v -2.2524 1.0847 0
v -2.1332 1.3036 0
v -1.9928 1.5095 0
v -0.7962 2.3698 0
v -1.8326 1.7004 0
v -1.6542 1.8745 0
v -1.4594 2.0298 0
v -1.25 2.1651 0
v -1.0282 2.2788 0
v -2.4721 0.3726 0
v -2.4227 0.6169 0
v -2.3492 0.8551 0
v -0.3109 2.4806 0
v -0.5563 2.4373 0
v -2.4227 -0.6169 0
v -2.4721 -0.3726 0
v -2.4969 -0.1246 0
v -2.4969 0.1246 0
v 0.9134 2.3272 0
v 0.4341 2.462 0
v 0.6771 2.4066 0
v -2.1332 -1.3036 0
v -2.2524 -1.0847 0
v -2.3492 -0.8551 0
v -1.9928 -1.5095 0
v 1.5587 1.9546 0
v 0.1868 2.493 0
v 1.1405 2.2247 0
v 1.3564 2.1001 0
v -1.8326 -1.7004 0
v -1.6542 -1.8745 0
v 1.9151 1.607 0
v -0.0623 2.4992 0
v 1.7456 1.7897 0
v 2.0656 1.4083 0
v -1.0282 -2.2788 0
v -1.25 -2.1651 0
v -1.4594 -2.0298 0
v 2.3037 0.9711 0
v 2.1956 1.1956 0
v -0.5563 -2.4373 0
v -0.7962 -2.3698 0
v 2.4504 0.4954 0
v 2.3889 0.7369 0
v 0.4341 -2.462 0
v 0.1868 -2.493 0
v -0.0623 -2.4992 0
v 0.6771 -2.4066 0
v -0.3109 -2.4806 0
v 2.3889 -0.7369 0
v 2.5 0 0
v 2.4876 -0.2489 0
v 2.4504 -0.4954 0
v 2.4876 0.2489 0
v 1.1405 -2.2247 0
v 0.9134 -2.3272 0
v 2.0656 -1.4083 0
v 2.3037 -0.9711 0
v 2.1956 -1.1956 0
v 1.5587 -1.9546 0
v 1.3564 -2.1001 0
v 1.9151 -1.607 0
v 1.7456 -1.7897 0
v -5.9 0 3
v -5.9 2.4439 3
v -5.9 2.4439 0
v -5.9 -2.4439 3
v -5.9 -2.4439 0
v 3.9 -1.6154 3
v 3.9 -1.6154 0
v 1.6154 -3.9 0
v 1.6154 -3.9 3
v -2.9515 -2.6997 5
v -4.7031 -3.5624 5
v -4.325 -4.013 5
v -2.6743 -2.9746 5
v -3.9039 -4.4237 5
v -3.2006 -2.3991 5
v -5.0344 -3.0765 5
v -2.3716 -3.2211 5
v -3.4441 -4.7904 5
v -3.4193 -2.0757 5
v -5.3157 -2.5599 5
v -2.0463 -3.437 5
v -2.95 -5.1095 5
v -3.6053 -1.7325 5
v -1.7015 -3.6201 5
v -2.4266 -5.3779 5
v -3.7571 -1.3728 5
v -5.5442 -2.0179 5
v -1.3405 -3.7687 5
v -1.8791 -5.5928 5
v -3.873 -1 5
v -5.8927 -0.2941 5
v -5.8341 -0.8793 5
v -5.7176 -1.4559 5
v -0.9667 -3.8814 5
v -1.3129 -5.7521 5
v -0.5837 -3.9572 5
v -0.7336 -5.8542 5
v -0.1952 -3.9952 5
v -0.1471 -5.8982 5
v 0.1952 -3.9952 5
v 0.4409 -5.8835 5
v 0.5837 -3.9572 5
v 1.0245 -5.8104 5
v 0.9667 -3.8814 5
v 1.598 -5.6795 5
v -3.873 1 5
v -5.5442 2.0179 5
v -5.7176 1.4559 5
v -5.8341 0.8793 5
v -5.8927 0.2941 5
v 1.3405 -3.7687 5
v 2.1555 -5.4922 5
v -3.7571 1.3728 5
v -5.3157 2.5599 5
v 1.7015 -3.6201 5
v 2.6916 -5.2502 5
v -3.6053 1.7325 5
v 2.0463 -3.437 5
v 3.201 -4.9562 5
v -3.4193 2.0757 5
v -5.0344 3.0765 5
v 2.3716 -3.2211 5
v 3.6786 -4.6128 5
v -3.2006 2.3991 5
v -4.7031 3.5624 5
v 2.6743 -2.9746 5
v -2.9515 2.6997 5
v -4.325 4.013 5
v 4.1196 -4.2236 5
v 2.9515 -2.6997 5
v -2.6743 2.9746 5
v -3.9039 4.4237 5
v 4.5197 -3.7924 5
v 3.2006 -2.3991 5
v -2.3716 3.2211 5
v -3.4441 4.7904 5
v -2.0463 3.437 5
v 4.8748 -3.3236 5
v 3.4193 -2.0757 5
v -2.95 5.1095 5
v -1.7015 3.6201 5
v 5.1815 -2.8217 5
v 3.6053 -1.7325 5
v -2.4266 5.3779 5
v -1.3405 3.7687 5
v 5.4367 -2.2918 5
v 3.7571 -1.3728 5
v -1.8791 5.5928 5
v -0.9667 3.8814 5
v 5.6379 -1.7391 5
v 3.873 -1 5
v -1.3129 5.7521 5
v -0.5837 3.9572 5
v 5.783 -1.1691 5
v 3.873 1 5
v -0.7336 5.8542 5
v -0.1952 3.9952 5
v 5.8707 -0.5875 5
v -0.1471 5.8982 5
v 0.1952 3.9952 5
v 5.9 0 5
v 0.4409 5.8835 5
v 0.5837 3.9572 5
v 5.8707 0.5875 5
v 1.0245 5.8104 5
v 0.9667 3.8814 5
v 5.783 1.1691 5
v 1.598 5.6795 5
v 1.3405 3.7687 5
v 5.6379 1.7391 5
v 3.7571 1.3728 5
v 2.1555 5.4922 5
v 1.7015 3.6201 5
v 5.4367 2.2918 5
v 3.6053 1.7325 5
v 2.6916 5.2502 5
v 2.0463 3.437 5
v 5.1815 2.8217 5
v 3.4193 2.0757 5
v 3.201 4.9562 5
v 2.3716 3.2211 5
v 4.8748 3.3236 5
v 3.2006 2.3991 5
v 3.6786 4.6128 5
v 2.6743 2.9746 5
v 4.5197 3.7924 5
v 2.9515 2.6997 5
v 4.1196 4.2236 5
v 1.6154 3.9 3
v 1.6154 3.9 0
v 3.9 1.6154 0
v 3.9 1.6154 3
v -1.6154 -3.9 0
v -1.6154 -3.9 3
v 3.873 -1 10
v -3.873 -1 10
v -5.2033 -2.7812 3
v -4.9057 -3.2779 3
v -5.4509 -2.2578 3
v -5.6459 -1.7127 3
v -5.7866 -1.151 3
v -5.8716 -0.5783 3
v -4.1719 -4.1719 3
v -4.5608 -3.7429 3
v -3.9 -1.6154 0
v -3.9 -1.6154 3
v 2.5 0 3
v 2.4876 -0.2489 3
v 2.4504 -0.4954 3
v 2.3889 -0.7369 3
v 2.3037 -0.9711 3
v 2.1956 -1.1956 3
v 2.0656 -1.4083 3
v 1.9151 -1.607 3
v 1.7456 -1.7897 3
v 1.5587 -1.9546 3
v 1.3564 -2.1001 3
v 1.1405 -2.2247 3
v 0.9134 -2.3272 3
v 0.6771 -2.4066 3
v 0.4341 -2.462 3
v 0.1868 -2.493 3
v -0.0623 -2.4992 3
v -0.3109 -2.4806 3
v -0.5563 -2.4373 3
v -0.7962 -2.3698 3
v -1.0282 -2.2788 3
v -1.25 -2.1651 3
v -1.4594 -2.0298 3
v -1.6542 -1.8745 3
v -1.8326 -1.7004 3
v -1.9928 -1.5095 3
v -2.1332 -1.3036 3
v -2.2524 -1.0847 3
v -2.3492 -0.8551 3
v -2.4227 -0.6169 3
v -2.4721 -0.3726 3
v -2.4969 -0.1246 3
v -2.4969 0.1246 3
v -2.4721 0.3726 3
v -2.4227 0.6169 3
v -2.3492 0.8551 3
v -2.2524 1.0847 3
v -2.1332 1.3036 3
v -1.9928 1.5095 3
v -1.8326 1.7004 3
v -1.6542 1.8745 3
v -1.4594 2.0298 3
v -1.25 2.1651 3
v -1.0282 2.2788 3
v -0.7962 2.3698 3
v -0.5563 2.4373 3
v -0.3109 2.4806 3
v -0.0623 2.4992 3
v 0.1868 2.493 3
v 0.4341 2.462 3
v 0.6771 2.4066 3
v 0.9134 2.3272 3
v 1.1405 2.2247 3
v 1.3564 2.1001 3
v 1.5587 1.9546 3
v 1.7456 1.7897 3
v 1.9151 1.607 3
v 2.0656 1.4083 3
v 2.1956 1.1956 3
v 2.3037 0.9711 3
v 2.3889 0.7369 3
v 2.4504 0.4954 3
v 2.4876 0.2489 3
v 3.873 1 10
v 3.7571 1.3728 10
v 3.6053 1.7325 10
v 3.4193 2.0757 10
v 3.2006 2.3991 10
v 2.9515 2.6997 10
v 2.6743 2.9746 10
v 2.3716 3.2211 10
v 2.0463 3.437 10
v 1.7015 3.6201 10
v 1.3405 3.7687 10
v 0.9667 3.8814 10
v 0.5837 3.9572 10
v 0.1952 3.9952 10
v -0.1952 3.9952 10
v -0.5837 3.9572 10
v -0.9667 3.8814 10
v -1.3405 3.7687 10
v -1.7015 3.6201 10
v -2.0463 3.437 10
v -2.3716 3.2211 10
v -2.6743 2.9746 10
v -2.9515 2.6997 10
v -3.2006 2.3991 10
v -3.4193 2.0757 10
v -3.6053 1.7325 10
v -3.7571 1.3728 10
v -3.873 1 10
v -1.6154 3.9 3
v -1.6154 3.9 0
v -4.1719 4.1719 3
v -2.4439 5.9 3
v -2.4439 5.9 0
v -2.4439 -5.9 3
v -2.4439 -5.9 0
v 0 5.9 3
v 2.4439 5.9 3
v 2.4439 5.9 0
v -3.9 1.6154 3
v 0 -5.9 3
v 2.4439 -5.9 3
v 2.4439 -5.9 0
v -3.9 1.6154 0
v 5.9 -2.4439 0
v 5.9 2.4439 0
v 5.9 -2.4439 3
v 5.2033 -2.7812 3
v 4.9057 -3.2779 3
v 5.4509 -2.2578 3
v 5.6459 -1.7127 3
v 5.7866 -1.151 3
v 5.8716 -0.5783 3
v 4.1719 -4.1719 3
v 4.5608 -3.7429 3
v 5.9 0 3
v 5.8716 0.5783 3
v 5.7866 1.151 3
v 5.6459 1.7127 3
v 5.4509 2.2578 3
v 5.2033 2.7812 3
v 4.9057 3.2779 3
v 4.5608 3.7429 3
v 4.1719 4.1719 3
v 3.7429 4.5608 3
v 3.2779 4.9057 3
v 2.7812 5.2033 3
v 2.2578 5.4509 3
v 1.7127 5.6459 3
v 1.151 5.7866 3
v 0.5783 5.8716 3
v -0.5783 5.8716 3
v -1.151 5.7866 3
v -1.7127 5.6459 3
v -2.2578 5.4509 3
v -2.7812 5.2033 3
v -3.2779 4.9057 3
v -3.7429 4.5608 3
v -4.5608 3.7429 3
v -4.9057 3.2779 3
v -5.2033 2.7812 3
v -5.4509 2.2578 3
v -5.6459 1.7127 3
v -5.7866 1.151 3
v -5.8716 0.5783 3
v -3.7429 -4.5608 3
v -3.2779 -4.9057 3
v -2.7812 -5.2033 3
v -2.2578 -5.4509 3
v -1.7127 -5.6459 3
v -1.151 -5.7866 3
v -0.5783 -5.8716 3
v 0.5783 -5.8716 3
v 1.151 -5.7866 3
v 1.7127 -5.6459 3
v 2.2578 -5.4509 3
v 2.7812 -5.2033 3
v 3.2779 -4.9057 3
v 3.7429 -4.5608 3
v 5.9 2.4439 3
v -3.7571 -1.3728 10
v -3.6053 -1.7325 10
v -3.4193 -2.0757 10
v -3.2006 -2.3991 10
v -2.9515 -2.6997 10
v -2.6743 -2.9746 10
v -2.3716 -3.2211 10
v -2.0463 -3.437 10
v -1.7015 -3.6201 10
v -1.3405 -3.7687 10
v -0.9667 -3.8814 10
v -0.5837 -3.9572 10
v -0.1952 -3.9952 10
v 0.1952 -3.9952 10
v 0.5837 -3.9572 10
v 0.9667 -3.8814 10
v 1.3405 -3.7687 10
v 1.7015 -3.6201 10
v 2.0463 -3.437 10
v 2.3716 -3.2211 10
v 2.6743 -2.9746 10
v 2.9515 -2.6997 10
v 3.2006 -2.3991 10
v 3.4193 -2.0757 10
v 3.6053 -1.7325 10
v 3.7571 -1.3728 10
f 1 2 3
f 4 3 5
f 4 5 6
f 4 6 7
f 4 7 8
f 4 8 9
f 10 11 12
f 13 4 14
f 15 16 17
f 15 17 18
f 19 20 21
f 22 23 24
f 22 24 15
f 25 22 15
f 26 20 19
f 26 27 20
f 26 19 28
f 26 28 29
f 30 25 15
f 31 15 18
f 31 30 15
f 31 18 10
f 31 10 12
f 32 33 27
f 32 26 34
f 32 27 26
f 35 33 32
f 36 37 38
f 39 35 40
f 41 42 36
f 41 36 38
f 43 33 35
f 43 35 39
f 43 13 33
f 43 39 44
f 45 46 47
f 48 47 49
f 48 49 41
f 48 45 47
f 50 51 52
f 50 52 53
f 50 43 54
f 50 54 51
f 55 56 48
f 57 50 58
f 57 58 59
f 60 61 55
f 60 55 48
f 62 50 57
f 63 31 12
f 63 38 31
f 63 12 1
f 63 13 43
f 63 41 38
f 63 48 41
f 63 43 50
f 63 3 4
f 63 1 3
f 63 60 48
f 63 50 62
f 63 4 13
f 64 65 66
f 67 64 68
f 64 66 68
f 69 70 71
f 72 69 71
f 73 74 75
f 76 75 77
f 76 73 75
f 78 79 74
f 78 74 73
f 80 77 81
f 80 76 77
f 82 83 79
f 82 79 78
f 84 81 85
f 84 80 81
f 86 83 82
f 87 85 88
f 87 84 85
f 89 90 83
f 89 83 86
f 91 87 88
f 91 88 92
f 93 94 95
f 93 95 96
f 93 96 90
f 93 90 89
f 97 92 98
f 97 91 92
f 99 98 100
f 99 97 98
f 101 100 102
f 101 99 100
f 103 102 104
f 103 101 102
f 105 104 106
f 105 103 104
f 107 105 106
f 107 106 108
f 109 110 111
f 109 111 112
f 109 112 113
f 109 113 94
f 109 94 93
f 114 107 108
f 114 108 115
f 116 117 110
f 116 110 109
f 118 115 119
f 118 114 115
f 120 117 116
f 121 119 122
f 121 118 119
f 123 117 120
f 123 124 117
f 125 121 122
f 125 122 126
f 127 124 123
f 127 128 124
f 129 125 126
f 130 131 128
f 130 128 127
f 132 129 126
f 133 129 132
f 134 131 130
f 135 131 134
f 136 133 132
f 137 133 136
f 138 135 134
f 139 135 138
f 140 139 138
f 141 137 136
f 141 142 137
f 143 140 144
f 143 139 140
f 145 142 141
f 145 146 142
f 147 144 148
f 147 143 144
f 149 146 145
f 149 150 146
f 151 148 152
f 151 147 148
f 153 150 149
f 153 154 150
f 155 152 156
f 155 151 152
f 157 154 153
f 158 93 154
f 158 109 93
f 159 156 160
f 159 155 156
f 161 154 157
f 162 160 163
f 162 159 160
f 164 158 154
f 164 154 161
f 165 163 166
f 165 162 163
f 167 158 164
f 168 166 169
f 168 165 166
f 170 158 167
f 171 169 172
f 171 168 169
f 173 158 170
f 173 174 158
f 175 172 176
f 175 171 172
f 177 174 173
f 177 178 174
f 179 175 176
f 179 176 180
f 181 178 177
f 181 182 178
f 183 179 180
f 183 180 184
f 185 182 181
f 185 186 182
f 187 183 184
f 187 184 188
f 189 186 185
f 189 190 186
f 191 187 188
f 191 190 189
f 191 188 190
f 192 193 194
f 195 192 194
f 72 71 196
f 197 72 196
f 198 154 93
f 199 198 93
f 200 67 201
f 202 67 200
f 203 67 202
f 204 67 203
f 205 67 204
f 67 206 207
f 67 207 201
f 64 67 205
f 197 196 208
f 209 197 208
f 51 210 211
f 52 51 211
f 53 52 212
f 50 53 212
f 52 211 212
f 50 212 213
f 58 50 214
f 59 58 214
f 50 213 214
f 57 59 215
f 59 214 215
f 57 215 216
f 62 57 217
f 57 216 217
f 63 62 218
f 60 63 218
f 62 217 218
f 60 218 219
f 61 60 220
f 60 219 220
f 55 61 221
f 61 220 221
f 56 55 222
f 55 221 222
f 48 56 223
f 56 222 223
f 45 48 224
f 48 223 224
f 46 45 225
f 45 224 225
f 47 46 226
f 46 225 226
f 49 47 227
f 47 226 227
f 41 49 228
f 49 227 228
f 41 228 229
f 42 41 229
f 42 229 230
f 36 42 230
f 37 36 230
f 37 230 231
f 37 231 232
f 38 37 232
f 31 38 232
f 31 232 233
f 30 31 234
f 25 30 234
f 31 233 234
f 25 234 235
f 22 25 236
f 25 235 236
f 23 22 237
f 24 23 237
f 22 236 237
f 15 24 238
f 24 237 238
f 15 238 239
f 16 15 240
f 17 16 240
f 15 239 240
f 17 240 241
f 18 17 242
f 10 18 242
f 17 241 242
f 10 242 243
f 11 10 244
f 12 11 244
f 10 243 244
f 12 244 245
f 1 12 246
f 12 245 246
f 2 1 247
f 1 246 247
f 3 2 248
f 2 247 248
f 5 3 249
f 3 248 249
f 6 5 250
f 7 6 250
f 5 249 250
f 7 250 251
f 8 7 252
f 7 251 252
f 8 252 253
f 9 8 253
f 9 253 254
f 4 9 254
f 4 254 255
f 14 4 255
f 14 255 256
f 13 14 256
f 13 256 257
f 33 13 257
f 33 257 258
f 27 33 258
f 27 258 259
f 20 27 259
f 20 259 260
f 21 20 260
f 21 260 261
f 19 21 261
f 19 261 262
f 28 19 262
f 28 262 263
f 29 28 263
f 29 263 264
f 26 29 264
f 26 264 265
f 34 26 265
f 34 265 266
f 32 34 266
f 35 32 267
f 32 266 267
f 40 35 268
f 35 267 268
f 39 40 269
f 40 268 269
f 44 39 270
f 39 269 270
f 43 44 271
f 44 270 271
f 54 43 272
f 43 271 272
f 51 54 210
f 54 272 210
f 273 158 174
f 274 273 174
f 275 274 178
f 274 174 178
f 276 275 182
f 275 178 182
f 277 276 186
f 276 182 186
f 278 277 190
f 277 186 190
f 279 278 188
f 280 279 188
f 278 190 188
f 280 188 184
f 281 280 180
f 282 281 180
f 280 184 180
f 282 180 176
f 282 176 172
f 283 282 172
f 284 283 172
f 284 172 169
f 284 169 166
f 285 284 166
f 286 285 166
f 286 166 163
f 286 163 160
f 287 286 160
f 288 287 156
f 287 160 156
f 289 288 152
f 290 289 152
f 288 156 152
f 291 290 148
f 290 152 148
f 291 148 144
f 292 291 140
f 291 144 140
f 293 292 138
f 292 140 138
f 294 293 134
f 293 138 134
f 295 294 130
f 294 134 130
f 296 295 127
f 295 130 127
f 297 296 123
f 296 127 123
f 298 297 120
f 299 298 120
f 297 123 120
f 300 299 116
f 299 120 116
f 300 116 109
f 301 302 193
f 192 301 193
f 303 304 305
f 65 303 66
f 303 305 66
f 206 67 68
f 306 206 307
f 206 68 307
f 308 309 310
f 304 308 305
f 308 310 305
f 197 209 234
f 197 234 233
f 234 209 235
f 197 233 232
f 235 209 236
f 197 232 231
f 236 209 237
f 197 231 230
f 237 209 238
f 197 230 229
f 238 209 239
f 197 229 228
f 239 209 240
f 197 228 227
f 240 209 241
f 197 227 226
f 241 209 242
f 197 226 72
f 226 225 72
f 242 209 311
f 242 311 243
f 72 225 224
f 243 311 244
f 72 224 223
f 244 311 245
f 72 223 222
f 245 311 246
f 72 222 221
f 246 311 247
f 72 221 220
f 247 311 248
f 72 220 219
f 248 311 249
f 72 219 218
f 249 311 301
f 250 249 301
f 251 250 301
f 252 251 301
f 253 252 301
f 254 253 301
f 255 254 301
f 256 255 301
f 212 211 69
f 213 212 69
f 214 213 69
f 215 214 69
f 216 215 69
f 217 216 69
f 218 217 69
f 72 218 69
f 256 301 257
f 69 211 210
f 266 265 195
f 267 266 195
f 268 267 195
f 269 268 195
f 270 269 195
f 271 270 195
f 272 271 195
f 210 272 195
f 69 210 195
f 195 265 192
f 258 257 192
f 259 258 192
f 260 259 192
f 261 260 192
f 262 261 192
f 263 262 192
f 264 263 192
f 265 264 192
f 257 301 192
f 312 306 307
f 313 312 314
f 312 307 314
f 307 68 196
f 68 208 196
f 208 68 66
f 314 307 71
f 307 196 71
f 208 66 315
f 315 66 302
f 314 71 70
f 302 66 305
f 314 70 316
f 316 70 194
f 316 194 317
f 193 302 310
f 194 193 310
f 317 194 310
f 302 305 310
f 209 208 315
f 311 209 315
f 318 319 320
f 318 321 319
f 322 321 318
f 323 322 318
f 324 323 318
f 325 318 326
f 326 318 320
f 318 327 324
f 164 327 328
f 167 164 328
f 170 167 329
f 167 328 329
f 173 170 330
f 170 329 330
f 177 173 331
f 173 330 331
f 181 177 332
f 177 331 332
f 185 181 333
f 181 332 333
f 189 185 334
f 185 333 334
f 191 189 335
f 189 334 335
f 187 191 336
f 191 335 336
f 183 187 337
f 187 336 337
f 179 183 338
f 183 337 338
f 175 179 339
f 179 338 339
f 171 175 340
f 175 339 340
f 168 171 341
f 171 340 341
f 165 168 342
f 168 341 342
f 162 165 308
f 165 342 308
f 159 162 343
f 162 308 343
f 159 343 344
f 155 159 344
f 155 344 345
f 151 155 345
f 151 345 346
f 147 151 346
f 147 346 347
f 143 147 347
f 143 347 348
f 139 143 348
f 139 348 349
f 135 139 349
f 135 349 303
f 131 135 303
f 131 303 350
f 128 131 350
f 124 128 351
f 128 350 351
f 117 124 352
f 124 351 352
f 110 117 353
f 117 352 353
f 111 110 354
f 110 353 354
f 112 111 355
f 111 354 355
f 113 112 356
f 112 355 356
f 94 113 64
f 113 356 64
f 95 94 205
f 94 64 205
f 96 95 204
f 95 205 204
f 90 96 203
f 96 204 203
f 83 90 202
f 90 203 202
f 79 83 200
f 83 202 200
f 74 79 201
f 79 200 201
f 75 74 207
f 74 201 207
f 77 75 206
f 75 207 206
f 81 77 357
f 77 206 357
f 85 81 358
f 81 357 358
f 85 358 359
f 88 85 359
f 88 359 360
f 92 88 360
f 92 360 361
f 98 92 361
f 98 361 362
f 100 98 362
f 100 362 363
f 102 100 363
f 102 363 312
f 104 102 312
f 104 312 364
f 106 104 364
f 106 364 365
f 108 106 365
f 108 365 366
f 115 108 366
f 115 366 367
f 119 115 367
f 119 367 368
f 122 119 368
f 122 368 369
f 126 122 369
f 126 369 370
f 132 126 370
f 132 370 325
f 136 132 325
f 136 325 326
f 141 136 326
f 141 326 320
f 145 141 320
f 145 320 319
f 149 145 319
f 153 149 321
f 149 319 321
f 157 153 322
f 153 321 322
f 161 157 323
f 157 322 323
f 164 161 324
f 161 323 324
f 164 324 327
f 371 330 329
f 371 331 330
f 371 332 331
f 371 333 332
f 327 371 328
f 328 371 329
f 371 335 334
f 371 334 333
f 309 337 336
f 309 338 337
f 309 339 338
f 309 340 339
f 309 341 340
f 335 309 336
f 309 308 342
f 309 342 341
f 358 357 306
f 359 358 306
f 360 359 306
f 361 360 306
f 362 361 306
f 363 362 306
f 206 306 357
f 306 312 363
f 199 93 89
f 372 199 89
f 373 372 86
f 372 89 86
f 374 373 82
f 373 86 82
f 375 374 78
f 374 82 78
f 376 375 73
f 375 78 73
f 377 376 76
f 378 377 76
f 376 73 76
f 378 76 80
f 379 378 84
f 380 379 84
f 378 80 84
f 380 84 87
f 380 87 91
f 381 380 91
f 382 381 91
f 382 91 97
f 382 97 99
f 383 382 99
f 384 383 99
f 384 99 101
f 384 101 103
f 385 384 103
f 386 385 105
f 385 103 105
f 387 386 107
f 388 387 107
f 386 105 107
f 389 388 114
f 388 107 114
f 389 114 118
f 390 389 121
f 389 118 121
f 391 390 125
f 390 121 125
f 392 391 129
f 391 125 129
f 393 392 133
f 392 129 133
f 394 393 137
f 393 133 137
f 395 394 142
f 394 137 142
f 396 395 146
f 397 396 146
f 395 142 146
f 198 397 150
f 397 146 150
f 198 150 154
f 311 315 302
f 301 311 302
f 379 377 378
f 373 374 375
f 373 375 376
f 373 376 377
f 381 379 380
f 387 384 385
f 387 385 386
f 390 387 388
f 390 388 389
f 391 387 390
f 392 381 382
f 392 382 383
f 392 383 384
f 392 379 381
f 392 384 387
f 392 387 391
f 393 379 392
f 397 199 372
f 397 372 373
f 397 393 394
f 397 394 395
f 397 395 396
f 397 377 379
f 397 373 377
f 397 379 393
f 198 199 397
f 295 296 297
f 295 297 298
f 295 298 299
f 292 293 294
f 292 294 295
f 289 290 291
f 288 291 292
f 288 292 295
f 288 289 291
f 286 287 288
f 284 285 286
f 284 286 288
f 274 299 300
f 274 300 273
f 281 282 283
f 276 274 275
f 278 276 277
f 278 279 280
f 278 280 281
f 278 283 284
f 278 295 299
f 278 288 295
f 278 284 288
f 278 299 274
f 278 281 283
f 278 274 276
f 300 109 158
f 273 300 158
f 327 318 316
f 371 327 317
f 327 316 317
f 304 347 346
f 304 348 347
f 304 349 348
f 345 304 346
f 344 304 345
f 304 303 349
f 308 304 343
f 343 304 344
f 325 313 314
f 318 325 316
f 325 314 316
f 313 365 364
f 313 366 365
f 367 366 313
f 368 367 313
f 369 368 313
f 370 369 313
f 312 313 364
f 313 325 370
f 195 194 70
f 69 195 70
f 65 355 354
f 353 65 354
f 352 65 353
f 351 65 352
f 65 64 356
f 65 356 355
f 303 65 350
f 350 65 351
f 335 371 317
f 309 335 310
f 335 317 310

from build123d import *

# Parameters (mm, degrees)
F1_DEPTH = 3
F2_R     = 5.9
F3_DEPTH = 2
F5_DEPTH = 5
F6_R     = 2.5
F7_DEPTH = 3


with BuildPart() as f1:
    # F0 (on Top) → F1 (new body)
    with BuildSketch(Plane.XY):
        Polygon((-2.44386, -5.9), (2.44386, -5.9), (5.9, -2.44386), (5.9, 2.44386), (2.44386, 5.9), (-2.44386, 5.9), (-5.9, 2.44386), (-5.9, -2.44386), align=None)
        Polygon((-1.615433, -3.9), (-3.9, -1.615433), (-3.9, 1.615433), (-1.615433, 3.9), (1.615433, 3.9), (3.9, 1.615433), (3.9, -1.615433), (1.615433, -3.9), align=None, mode=Mode.SUBTRACT)
    extrude(amount=F1_DEPTH)

    # F2 (on face) → F3 (join)
    with BuildSketch(Plane.XY.offset(3)):
        Circle(F2_R)
    extrude(amount=F3_DEPTH)

    # F4 (on face) → F5 (join)
    with BuildSketch(Plane.XY.offset(5)):
        with BuildLine():
            ThreePointArc((3.872983, 1), (0, 4), (-3.872983, 1))
            Line((-3.872983, 1), (3.872983, 1))
        make_face()
        with BuildLine():
            ThreePointArc((-3.872983, -1), (0, -4), (3.872983, -1))
            Line((3.872983, -1), (-3.872983, -1))
        make_face()
    extrude(amount=F5_DEPTH)

    # F6 (on face) → F7 (join, through all)
    with BuildSketch(Plane(origin=(0, 0, 3), x_dir=(1, 0, 0), z_dir=(0, 0, -1))):
        Circle(F6_R)
    extrude(amount=F7_DEPTH)


solid = f1.part
